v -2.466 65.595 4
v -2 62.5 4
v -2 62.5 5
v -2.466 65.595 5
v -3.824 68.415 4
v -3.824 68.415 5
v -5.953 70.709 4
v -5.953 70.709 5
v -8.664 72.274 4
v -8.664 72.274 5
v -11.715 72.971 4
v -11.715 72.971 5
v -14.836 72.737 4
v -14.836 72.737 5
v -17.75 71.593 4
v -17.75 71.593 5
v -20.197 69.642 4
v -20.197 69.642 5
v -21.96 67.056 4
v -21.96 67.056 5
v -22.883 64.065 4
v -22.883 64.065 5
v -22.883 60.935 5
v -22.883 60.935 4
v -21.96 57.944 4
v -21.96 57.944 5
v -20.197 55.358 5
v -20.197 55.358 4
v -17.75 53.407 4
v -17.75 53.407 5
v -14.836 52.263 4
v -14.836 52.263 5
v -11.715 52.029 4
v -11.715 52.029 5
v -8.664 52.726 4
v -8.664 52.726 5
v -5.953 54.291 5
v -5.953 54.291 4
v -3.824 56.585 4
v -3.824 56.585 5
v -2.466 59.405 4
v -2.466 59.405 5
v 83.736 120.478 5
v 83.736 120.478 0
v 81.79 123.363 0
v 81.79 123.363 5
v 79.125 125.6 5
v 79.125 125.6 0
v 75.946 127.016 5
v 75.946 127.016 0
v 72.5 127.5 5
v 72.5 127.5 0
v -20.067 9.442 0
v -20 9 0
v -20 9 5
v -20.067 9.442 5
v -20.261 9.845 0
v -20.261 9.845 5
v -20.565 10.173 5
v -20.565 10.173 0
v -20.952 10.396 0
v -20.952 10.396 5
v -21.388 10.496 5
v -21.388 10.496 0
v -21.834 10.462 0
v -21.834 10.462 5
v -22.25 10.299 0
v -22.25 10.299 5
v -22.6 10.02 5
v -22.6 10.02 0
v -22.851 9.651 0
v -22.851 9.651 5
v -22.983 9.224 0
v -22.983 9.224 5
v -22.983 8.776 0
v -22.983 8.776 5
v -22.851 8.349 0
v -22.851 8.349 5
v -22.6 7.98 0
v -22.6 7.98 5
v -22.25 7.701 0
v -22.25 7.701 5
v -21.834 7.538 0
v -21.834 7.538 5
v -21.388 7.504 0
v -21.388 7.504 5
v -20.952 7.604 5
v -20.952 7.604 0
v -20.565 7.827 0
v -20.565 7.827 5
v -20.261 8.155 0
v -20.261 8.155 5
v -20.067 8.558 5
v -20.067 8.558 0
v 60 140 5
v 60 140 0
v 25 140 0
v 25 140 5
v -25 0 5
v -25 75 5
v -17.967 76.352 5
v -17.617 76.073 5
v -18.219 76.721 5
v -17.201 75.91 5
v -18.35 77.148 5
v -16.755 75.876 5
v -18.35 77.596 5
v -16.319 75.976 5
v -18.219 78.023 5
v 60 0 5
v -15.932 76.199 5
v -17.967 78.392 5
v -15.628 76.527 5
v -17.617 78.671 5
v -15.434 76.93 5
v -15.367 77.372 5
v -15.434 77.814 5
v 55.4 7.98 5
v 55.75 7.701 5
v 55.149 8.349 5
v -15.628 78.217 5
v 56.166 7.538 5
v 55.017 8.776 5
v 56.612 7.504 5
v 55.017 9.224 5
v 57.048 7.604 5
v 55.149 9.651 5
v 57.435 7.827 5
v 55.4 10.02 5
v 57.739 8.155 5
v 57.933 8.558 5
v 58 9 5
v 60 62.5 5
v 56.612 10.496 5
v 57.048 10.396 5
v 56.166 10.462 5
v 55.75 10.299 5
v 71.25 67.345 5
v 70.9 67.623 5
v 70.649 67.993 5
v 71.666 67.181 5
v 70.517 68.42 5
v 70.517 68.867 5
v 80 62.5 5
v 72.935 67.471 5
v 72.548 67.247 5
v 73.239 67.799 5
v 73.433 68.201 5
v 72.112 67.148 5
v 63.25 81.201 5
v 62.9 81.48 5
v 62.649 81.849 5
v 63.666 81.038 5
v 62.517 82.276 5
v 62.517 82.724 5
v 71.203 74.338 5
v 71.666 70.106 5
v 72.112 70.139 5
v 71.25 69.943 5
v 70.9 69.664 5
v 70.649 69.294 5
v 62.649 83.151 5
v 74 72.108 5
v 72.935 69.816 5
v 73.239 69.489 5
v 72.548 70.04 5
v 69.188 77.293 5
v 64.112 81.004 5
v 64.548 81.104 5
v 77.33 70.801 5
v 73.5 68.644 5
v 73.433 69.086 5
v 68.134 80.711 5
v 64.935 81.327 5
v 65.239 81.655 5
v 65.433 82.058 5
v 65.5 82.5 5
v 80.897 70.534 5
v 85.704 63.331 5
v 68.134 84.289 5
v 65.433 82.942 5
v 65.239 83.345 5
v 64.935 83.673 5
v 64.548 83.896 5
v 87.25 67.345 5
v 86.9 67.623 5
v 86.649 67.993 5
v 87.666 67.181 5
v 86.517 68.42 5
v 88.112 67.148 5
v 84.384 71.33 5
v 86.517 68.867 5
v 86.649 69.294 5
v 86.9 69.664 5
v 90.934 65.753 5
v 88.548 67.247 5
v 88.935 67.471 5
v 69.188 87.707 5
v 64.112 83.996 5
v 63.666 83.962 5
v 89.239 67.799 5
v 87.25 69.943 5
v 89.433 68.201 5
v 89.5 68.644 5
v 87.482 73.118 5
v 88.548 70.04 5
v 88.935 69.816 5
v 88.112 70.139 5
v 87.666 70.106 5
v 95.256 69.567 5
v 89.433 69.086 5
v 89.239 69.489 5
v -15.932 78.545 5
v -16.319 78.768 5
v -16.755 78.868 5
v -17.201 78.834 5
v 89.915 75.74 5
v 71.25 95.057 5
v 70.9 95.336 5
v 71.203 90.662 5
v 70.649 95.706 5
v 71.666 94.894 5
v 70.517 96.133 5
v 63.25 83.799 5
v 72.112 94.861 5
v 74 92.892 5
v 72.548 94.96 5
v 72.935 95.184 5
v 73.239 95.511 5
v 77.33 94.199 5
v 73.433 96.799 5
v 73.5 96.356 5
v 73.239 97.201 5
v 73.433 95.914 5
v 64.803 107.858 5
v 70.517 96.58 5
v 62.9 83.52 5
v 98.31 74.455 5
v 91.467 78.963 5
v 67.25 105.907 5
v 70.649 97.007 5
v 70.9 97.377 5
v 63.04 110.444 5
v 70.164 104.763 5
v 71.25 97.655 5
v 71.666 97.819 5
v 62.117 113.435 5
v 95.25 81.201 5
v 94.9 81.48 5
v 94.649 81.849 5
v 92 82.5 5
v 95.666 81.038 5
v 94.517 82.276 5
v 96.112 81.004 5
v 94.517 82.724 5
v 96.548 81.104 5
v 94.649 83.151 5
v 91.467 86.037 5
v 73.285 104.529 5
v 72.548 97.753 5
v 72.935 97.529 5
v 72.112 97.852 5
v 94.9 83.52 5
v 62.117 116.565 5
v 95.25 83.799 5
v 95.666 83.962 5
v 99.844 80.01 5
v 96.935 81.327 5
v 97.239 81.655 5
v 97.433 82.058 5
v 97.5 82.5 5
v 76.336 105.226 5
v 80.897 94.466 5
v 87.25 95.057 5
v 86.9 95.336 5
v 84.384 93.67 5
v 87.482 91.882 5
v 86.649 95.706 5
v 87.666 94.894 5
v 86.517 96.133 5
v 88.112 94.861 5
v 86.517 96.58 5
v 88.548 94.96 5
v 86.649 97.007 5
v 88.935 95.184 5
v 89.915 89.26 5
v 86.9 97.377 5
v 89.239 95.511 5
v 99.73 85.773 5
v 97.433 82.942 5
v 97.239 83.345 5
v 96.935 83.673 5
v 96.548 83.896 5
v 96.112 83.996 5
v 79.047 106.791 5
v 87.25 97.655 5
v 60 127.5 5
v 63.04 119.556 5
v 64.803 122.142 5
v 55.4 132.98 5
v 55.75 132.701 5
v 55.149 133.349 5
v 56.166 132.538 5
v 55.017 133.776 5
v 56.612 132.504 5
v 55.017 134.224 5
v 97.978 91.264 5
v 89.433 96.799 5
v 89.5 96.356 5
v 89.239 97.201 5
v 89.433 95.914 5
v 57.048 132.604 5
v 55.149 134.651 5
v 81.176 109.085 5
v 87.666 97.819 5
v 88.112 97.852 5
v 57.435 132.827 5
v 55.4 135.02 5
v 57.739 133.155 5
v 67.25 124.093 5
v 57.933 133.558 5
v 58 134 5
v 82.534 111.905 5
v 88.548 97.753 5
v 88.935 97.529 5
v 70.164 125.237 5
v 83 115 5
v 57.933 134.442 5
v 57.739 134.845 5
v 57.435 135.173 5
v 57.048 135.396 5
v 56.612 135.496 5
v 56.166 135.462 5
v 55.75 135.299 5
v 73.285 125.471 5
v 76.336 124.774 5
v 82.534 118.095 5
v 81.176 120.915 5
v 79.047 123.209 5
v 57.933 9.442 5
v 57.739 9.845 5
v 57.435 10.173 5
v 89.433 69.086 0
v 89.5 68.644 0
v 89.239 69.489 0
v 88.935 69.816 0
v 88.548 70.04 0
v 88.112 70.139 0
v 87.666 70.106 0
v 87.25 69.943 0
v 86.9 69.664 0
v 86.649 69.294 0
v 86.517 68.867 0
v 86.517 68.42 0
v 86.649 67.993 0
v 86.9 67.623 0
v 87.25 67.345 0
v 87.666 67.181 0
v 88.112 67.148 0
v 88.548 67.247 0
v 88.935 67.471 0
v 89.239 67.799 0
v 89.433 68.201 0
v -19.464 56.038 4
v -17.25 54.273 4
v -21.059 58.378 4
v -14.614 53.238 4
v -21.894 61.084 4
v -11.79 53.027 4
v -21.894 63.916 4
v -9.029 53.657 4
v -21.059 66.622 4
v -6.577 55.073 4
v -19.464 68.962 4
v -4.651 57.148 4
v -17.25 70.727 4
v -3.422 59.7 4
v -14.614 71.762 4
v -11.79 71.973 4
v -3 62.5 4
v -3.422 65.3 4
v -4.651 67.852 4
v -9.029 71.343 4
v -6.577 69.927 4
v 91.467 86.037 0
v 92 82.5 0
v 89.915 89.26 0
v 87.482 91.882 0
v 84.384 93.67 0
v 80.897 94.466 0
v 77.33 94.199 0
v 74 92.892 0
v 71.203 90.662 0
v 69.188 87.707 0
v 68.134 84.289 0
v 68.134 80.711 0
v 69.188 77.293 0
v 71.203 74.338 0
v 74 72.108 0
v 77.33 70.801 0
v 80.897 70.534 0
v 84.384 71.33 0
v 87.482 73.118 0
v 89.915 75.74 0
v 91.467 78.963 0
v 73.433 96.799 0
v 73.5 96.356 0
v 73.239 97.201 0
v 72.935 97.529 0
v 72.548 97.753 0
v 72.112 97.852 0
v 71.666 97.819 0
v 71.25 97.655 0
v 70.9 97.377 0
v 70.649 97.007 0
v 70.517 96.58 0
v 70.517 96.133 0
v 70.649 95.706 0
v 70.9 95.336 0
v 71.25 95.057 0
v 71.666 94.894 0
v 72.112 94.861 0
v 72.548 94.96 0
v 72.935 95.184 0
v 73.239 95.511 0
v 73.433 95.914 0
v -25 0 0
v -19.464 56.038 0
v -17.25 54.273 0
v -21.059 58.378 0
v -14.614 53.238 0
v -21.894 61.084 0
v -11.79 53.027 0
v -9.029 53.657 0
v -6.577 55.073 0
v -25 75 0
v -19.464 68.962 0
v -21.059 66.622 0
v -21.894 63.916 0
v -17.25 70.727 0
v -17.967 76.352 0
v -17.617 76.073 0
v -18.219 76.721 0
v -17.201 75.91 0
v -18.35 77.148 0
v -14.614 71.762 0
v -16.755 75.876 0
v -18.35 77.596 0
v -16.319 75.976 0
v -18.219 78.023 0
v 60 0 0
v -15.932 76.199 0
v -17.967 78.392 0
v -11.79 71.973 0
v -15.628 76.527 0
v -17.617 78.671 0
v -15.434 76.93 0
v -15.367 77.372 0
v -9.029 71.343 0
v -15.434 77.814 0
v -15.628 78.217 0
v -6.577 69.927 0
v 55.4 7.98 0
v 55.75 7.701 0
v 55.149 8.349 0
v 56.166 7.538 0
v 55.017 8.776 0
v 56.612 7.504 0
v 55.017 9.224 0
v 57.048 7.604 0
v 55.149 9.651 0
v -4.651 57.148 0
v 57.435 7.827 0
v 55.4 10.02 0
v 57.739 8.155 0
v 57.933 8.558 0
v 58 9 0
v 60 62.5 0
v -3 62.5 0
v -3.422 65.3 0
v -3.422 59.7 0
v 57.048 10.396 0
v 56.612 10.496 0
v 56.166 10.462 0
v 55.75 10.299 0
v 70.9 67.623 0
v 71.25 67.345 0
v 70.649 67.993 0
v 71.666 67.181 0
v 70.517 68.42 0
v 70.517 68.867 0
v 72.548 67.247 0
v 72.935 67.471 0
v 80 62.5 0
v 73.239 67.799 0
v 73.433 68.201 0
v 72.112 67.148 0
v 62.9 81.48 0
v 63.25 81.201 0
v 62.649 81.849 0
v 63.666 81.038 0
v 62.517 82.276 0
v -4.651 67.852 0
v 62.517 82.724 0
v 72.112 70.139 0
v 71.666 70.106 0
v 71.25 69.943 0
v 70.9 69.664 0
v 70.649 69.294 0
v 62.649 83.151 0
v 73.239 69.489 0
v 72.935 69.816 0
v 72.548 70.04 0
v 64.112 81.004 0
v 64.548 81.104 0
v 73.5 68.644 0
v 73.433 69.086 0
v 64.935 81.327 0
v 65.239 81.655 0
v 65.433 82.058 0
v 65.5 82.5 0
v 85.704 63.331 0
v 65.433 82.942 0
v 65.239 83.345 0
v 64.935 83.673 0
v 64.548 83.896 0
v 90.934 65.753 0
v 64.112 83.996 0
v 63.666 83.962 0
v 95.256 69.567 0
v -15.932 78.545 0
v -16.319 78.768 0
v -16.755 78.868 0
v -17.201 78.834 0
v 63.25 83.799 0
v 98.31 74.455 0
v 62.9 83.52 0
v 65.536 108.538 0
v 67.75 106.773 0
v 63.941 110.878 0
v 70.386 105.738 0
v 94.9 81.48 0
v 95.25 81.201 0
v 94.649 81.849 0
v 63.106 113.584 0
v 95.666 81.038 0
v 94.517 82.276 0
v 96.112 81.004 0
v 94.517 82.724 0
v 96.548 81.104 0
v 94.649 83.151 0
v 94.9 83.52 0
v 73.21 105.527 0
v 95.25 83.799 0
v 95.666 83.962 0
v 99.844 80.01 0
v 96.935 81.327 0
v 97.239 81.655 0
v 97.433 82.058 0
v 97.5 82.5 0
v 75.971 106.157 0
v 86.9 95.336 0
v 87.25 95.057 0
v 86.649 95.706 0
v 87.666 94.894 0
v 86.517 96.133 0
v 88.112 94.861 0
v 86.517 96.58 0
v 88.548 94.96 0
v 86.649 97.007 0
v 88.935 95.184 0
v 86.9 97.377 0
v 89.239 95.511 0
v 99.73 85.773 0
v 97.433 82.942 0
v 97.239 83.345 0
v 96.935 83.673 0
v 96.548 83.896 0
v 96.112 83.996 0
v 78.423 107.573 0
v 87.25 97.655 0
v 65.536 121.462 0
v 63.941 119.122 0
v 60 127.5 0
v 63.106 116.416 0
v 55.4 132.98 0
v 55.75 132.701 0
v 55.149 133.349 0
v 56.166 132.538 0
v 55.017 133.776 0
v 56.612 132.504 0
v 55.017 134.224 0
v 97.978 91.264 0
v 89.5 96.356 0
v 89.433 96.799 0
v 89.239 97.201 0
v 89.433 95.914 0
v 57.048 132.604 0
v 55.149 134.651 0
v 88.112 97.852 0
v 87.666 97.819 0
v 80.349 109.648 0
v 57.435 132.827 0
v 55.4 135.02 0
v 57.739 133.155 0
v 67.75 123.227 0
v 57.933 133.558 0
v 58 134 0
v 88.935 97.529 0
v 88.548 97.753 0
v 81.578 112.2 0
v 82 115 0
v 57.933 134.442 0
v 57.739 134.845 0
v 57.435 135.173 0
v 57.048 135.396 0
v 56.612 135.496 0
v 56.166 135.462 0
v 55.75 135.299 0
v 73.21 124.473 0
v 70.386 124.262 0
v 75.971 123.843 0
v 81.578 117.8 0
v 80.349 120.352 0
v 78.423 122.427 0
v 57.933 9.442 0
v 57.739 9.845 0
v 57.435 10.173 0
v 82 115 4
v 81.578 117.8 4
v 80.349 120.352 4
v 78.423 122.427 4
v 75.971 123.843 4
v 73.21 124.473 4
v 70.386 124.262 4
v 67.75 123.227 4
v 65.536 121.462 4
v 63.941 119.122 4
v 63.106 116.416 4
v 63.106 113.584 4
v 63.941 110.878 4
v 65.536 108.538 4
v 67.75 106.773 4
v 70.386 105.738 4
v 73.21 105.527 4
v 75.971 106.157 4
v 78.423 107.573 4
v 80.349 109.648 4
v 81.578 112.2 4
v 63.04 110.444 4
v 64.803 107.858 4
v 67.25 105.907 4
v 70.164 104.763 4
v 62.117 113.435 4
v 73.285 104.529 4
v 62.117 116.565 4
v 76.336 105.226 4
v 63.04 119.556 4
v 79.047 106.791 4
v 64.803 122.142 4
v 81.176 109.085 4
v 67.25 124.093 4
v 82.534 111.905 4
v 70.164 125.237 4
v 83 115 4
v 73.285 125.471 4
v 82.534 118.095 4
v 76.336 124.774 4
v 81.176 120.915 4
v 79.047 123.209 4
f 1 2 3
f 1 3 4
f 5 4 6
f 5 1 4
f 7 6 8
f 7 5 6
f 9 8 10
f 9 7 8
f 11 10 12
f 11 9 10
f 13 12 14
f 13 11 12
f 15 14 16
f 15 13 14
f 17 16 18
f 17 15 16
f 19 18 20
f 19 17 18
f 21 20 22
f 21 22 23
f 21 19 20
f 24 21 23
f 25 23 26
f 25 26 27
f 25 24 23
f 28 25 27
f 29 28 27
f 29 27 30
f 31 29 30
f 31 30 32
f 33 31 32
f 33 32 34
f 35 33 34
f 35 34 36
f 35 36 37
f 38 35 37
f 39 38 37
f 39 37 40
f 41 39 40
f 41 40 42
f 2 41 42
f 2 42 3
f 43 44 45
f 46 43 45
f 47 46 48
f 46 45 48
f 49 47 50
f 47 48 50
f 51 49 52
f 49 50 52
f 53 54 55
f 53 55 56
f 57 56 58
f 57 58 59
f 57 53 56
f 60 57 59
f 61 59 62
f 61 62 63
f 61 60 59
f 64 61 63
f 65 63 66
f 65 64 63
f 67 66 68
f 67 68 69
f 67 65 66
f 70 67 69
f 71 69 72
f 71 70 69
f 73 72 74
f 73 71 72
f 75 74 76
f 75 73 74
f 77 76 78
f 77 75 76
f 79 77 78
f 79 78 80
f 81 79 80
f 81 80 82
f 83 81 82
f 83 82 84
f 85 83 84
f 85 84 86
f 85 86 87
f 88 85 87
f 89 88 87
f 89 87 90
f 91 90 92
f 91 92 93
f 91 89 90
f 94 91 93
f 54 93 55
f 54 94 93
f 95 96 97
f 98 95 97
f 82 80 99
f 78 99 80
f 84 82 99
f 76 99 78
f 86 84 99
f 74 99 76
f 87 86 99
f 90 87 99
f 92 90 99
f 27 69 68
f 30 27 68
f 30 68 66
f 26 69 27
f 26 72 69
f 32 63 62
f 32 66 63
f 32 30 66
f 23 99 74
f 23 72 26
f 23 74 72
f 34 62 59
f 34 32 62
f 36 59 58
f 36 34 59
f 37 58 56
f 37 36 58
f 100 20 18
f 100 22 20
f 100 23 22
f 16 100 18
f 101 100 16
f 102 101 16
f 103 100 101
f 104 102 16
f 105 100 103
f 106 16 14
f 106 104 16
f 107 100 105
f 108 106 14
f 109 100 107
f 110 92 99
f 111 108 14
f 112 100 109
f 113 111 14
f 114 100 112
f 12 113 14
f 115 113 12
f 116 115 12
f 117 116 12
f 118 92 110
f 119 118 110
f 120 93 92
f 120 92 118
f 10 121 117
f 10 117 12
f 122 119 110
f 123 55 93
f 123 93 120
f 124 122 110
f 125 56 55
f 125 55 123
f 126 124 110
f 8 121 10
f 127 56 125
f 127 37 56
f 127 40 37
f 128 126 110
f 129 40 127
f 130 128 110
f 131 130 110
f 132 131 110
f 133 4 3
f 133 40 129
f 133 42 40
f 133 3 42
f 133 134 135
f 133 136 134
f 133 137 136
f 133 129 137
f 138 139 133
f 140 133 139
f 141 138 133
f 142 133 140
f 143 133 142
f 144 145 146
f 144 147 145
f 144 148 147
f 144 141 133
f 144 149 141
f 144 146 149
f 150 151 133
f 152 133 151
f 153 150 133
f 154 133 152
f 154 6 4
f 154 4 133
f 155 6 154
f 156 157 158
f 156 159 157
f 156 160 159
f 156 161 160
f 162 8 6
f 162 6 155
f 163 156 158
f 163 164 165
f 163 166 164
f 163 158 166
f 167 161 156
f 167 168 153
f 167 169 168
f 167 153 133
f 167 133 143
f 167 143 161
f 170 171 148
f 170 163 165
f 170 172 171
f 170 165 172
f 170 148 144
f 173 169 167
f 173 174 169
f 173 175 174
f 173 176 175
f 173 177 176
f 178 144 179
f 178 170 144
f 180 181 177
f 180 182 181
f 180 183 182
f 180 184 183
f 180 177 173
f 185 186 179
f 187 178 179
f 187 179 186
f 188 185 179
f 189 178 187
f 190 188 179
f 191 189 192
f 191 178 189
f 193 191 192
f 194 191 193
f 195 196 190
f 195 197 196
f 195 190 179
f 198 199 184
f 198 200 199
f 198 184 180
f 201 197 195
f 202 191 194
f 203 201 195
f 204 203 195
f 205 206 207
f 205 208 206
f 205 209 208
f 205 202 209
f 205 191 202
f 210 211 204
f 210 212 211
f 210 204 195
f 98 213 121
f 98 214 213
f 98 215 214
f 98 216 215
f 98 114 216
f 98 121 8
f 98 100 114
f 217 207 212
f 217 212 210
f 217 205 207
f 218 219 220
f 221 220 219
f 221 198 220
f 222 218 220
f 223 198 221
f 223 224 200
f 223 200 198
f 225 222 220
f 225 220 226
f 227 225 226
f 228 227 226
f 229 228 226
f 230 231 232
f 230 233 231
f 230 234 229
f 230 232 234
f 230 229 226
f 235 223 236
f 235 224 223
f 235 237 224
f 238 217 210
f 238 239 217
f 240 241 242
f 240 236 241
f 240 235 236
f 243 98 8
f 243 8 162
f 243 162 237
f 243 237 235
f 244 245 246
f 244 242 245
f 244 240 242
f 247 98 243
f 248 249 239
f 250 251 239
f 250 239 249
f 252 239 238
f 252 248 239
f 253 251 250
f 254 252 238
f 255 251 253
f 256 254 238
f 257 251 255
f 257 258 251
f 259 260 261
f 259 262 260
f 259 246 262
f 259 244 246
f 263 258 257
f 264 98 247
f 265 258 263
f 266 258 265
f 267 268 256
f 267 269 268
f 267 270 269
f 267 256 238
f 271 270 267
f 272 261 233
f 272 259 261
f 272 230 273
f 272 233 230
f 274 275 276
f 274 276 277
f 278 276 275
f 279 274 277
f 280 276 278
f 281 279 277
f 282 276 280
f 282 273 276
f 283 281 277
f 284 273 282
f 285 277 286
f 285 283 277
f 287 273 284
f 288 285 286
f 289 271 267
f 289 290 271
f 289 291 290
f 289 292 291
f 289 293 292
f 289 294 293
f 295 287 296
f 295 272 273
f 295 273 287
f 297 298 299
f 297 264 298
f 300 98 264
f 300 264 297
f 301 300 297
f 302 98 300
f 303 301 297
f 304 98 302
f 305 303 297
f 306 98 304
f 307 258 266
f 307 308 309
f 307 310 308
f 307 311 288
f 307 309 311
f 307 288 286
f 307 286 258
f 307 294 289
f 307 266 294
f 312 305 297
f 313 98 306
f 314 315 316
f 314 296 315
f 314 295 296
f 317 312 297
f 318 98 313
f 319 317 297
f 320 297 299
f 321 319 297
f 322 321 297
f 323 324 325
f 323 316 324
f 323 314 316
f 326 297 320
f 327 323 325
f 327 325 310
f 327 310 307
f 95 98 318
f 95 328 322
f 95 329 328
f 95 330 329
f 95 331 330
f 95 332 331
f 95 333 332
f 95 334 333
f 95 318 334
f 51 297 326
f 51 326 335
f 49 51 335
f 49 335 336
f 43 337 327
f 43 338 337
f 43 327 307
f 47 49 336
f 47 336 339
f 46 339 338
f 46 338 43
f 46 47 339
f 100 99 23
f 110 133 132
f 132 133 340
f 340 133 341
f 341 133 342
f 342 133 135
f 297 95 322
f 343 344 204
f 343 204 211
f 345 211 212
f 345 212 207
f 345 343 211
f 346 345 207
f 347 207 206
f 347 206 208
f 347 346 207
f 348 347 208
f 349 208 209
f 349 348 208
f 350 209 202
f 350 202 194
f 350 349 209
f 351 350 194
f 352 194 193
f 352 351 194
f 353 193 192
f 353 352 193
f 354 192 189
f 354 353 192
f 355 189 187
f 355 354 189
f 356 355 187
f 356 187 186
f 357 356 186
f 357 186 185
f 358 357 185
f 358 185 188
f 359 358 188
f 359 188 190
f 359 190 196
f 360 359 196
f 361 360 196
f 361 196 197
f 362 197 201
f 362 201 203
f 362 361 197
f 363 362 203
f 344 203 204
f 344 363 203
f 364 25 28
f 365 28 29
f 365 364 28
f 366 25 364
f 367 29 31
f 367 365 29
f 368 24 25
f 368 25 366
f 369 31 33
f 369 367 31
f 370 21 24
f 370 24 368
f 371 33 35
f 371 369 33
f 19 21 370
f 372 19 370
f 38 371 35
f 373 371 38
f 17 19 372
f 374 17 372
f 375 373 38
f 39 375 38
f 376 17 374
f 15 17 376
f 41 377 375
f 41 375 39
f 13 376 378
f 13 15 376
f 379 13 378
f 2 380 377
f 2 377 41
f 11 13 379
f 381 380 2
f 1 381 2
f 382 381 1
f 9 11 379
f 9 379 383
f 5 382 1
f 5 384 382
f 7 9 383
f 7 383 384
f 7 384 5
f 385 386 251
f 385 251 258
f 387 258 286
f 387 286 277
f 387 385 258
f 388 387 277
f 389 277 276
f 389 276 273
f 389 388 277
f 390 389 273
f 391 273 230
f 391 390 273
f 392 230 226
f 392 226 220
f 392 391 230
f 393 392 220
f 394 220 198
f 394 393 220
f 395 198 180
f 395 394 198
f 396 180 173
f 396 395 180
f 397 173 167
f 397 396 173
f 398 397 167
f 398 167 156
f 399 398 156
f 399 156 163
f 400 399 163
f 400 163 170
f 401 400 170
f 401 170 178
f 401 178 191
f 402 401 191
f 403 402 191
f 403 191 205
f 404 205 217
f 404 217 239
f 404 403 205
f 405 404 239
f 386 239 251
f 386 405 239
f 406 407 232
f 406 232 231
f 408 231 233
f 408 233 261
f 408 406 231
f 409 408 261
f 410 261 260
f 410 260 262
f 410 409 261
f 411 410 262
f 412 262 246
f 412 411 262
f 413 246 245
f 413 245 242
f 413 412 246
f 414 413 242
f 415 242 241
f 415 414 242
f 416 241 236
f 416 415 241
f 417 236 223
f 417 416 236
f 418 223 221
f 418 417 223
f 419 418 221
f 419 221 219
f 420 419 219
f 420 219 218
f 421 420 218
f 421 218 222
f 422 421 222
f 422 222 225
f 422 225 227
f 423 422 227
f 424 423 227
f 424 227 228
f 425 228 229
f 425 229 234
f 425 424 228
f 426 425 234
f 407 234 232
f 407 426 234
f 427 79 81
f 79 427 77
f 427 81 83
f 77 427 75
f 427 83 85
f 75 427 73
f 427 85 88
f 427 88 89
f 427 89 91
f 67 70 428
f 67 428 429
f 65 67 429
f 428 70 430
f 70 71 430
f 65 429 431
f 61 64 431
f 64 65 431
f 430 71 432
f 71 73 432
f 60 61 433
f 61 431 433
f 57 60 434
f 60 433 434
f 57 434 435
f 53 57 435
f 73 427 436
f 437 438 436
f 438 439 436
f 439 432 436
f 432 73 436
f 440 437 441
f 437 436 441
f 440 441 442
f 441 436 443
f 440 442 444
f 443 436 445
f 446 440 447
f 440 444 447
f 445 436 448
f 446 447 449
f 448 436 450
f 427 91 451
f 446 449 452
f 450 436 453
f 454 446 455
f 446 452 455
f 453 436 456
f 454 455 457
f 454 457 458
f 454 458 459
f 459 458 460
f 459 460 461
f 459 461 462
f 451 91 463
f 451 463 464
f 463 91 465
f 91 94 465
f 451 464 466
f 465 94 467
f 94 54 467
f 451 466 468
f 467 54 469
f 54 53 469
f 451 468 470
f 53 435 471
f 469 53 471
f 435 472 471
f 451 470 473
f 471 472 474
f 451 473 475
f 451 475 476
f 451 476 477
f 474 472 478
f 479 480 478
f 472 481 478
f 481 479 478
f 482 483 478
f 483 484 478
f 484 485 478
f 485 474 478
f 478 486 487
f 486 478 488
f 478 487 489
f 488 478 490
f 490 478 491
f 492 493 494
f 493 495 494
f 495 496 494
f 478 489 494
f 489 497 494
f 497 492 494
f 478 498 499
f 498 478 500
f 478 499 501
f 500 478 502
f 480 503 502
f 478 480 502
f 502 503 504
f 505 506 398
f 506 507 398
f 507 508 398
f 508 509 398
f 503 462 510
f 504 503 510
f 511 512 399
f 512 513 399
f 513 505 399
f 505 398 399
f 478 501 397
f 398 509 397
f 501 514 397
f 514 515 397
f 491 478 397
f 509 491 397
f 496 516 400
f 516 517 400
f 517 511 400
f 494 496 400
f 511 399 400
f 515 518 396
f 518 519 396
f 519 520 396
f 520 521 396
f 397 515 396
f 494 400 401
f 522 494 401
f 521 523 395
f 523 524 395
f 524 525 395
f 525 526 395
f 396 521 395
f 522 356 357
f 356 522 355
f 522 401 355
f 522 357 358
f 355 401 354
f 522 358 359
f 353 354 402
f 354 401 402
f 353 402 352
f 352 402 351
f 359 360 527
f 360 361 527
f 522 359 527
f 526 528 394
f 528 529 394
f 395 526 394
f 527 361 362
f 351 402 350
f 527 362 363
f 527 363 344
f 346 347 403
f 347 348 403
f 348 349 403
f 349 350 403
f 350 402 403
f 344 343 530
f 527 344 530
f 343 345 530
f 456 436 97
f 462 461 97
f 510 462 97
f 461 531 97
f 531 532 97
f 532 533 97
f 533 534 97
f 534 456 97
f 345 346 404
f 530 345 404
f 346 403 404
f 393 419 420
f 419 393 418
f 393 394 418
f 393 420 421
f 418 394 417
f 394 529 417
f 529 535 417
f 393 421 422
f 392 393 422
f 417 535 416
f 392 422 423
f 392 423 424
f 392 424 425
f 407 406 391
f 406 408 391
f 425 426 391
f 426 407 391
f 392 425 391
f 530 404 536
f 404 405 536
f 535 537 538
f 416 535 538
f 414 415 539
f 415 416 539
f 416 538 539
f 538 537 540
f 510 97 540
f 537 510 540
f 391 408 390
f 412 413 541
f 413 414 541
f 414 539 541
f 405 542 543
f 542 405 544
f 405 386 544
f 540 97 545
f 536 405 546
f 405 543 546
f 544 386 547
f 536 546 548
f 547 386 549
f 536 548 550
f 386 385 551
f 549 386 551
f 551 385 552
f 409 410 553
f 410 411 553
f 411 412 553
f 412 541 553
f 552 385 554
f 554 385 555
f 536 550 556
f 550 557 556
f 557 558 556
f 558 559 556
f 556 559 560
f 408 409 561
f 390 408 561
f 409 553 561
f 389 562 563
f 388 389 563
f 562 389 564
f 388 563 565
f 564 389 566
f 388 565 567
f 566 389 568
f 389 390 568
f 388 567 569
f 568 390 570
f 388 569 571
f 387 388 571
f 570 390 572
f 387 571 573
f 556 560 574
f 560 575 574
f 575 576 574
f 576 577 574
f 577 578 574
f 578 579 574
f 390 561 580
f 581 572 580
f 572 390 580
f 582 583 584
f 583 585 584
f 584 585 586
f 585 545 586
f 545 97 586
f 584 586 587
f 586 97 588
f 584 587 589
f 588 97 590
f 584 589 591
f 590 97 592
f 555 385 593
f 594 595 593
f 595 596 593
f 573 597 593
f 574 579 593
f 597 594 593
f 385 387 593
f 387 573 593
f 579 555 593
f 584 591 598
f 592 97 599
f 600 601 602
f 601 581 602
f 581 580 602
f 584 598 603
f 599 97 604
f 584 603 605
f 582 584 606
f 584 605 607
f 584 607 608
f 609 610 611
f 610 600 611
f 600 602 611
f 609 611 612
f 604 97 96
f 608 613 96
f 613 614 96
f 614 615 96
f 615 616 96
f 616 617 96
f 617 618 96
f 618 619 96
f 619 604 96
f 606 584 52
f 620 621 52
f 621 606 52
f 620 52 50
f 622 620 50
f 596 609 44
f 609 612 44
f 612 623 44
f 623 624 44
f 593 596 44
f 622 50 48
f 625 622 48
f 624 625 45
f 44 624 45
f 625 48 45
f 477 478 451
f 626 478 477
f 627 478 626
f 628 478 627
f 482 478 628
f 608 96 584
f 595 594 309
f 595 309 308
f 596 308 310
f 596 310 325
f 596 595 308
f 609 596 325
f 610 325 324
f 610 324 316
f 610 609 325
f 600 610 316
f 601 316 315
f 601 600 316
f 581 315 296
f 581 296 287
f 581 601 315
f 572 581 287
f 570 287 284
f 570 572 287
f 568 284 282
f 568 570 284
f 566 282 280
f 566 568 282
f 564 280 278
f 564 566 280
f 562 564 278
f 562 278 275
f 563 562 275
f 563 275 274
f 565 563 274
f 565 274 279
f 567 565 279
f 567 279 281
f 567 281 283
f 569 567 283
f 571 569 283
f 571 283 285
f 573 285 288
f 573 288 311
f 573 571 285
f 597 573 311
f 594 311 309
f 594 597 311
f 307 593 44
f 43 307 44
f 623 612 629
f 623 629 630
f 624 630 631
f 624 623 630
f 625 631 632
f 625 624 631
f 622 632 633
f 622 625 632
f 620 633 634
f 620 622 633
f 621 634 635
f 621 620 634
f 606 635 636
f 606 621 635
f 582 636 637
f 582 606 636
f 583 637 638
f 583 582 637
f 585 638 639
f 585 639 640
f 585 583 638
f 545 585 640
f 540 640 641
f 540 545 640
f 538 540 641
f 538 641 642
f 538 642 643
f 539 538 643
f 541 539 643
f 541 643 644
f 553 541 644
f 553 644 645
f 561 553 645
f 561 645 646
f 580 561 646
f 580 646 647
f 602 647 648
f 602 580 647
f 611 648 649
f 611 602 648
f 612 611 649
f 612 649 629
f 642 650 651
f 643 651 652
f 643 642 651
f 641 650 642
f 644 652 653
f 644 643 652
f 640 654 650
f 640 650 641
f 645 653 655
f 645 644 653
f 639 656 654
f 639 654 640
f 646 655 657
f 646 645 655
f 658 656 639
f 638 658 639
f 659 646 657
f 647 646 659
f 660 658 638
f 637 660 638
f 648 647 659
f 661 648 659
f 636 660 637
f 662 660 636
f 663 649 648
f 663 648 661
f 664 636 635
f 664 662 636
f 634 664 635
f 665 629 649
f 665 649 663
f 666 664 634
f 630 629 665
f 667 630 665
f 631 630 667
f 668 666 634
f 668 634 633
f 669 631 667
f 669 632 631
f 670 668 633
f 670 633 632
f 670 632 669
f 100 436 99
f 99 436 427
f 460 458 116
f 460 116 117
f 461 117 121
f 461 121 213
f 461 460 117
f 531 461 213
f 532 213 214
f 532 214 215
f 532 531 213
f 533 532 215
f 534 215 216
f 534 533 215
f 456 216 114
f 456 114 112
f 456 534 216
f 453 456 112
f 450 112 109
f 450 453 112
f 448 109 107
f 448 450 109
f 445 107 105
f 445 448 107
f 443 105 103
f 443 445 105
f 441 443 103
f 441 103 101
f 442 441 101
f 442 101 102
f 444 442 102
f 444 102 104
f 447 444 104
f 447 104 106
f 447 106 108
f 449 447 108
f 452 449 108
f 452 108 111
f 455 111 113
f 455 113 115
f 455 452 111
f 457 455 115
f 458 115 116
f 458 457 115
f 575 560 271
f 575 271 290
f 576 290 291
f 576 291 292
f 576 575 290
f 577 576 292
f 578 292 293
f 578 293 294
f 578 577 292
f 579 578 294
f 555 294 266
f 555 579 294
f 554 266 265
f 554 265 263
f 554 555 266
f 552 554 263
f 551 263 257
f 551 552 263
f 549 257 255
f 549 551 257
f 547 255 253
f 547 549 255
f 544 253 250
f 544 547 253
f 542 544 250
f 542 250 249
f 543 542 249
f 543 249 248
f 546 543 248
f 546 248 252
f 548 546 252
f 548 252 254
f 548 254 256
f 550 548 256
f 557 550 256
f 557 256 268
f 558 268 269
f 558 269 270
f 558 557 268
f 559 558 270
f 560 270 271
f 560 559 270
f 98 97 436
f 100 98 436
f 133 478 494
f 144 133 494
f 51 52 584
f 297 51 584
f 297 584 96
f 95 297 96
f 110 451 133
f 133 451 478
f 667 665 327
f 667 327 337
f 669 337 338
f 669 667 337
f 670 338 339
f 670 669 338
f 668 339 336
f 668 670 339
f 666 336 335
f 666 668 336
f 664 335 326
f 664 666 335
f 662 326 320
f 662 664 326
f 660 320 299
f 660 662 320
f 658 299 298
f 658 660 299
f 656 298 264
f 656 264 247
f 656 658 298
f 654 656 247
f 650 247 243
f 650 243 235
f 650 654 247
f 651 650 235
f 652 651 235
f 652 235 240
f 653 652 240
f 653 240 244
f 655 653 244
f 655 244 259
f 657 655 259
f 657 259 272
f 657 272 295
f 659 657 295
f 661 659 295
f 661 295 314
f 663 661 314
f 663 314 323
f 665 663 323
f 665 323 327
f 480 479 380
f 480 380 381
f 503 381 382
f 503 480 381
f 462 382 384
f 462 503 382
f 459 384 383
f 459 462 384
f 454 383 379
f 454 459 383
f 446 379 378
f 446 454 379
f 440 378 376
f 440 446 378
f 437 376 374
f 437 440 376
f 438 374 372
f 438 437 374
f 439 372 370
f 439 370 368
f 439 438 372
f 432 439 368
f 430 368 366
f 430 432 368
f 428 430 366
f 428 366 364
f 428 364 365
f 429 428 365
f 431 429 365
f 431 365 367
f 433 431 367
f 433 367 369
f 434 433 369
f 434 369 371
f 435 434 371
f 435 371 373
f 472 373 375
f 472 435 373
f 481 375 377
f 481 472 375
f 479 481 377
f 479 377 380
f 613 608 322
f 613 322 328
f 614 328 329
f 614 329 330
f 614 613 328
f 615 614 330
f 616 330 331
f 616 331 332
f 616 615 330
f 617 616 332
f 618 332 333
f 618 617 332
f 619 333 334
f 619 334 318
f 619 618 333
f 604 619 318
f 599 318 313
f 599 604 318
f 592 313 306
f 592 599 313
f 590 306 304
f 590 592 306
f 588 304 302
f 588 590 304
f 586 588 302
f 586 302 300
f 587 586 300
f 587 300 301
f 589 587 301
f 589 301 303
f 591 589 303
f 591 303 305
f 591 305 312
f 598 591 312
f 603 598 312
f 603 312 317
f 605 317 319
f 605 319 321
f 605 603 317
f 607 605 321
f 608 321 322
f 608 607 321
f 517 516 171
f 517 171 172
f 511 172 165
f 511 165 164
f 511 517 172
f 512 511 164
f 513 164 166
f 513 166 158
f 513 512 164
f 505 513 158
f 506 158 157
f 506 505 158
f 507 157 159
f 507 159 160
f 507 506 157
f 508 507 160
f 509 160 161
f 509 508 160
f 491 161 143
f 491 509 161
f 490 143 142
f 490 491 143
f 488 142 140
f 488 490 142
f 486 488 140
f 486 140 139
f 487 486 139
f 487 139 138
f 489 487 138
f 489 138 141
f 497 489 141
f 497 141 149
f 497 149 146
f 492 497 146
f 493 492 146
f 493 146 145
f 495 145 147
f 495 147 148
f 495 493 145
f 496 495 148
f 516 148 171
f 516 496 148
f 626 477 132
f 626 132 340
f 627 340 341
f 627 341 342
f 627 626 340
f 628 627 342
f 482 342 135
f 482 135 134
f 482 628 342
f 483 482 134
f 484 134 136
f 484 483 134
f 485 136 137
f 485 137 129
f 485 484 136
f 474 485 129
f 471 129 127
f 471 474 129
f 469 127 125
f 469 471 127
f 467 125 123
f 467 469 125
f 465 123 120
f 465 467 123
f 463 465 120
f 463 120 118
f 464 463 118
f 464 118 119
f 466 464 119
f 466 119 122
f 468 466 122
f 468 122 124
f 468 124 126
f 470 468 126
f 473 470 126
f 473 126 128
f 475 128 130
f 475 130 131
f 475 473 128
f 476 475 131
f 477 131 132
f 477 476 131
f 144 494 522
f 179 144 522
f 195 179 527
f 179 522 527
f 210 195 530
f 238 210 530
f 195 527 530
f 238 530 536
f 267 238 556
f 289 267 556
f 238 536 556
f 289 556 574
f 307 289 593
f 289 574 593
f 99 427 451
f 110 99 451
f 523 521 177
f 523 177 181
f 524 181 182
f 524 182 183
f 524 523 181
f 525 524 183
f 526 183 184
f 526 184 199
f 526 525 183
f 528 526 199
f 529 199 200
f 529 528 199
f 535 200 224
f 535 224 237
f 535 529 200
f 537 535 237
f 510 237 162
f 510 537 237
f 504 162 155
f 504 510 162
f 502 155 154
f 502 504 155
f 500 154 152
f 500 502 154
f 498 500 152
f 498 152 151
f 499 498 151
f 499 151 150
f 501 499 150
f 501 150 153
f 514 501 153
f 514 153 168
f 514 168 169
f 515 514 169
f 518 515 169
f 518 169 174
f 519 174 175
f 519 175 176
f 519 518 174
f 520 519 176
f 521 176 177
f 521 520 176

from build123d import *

# Parameters (mm, degrees)
SKETCH1_R           = 1.5
SKETCH1_R_2         = 10.5
SKETCH1_R_3         = 12
BOSS_EXTRUDE1_DEPTH = 5
SKETCH1_3_R         = 10.5
SKETCH1_3_R_2       = 9.5
BOSS_EXTRUDE2_DEPTH = 4


with BuildPart() as part:
    # Sketch1 → Boss-Extrude1 (new body)
    with BuildSketch(Plane.XY):
        with BuildLine():
            Line((-25, 0), (60, 0))
            Line((60, 0), (60, 62.5))
            Line((60, 62.5), (80, 62.5))
            ThreePointArc((80, 62.5), (96.95996608, 71.9000212), (97.97752809, 91.264044944))
            Line((97.97752809, 91.264044944), (83.735955056, 120.47752809))
            ThreePointArc((83.735955056, 120.47752809), (79.12498675, 125.5999788), (72.5, 127.5))
            Line((72.5, 127.5), (60, 127.5))
            Line((60, 127.5), (60, 140))
            Line((60, 140), (25, 140))
            Line((25, 140), (-25, 75))
            Line((-25, 75), (-25, 0))
        make_face()
        with Locations((-21.5, 9)):
            Circle(SKETCH1_R, mode=Mode.SUBTRACT)
        with Locations((-12.5, 62.5)):
            Circle(SKETCH1_R_2, mode=Mode.SUBTRACT)
        with Locations((56.5, 9)):
            Circle(SKETCH1_R, mode=Mode.SUBTRACT)
        with Locations((56.5, 134)):
            Circle(SKETCH1_R, mode=Mode.SUBTRACT)
        with Locations((-16.867190649, 77.372042423)):
            Circle(SKETCH1_R, mode=Mode.SUBTRACT)
        with Locations((72.5, 115)):
            Circle(SKETCH1_R_2, mode=Mode.SUBTRACT)
        with Locations((88, 96.356406461)):
            Circle(SKETCH1_R, mode=Mode.SUBTRACT)
        with Locations((72, 96.356406461)):
            Circle(SKETCH1_R, mode=Mode.SUBTRACT)
        with Locations((72, 68.643593539)):
            Circle(SKETCH1_R, mode=Mode.SUBTRACT)
        with Locations((88, 68.643593539)):
            Circle(SKETCH1_R, mode=Mode.SUBTRACT)
        with Locations((64, 82.5)):
            Circle(SKETCH1_R, mode=Mode.SUBTRACT)
        with Locations((80, 82.5)):
            Circle(SKETCH1_R_3, mode=Mode.SUBTRACT)
        with Locations((96, 82.5)):
            Circle(SKETCH1_R, mode=Mode.SUBTRACT)
    extrude(amount=BOSS_EXTRUDE1_DEPTH)

    # Sketch1<3> → Boss-Extrude2 (add)
    # profile 1 of 2: a face of its own
    with BuildSketch(Plane.XY):
        with Locations((-12.5, 62.5)):
            Circle(SKETCH1_3_R)
        with Locations((-12.5, 62.5)):
            Circle(SKETCH1_3_R_2, mode=Mode.SUBTRACT)
    # profile 2 of 2: a face of its own
    with BuildSketch(Plane.XY):
        with Locations((72.5, 115)):
            Circle(SKETCH1_3_R)
        with Locations((72.5, 115)):
            Circle(SKETCH1_3_R_2, mode=Mode.SUBTRACT)
    extrude(amount=BOSS_EXTRUDE2_DEPTH)


solid = part.part
